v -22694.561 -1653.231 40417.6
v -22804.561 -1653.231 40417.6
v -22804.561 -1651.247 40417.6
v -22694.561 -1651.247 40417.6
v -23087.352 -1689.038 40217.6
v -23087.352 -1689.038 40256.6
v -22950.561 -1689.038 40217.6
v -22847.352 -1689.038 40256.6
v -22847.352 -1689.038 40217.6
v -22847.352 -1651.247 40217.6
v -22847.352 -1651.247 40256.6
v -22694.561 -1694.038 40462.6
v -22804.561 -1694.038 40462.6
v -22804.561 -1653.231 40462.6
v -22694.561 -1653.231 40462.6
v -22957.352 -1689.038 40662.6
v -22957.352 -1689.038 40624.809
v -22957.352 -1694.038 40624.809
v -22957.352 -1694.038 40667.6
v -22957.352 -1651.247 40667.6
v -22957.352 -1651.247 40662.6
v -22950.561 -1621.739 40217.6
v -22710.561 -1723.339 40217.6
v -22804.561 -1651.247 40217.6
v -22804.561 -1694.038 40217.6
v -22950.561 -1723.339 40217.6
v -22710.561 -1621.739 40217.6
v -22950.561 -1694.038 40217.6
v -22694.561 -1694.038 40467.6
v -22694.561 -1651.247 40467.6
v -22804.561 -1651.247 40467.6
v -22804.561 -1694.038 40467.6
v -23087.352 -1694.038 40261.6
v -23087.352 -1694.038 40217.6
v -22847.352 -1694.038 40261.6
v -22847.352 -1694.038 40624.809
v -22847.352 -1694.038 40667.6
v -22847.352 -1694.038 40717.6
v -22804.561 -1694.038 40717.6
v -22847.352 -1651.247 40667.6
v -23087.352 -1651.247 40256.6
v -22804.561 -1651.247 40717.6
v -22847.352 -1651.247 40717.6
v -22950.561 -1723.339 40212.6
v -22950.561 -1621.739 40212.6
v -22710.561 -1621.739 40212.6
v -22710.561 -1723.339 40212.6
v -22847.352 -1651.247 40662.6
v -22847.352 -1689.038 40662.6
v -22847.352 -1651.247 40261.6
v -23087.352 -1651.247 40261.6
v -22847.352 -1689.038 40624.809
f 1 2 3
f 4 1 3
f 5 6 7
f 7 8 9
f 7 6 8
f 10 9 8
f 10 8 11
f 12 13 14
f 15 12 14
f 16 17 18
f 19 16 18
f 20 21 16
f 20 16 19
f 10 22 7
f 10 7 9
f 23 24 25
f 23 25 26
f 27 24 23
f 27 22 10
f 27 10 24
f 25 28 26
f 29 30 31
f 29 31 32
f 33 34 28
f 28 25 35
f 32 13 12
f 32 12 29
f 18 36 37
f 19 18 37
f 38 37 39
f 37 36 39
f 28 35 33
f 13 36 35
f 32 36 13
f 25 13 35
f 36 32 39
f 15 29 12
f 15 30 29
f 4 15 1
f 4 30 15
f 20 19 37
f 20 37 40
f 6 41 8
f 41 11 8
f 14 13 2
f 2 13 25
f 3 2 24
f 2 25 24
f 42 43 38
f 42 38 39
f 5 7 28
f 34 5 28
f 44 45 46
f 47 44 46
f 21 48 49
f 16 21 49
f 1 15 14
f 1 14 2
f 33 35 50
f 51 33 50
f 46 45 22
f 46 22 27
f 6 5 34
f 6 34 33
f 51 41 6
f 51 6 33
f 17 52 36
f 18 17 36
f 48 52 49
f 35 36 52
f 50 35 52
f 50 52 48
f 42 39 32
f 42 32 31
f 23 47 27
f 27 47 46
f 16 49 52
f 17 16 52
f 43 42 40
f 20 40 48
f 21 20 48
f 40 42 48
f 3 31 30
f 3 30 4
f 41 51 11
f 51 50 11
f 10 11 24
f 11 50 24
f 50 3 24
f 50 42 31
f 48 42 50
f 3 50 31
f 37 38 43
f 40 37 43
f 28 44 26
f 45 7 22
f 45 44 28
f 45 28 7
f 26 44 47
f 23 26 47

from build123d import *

# Parameters (mm, degrees)
SKETCH1_W             = 240
SKETCH1_H             = 101.6
BOSS_EXTRUDE1_DEPTH   = 5
SKETCH2_W             = 42.790852113
SKETCH2_H             = 42.790852114
BOSS_EXTRUDE2_DEPTH   = 500
BOSS_EXTRUDE3_DEPTH   = 110
BOSS_EXTRUDE4_DEPTH   = 110
BOSS_EXTRUDE4_2_DEPTH = 110
BOSS_EXTRUDE5_START   = 110
BOSS_EXTRUDE5_DEPTH   = 130


# Read off the part's stored shape, not the designer's step: Boss-Extrude3
with BuildPart() as part:
    # Sketch1 → Boss-Extrude1 (new body)
    with BuildSketch(Plane.XY.offset(40212.600196068)):
        with Locations((-22830.561141865, -1672.538517707)):
            Rectangle(SKETCH1_W, SKETCH1_H)
    extrude(amount=BOSS_EXTRUDE1_DEPTH)


with BuildPart() as body_2:
    # Sketch2 → Boss-Extrude2 (new body)
    with BuildSketch(Plane.XY.offset(40217.600196068)):
        with Locations((-22825.956567922, -1672.642858756)):
            Rectangle(SKETCH2_W, SKETCH2_H)
    extrude(amount=BOSS_EXTRUDE2_DEPTH)


with BuildPart() as body_3:
    # Boss-Extrude3 outline → Boss-Extrude3 (new body)
    with BuildSketch(Plane(origin=(-22804.561141865, 0, 0), x_dir=(0, 0, -1), z_dir=(1, 0, 0))):
        Polygon((-40467.600196068, -1694.038284813), (-40462.600196068, -1694.038284813), (-40462.600196068, -1653.231371608), (-40417.600196068, -1653.231371608), (-40417.600196068, -1651.247432699), (-40467.600196068, -1651.247432699), align=None)
    extrude(amount=BOSS_EXTRUDE3_DEPTH)


with BuildPart() as body_4:
    # Sketch4 → Boss-Extrude4 (new body)
    with BuildSketch(Plane.ZY.offset(22847.351993978)):
        Polygon((40667.600196068, -1651.247432699), (40662.600196068, -1651.247432699), (40662.600196068, -1689.038284813), (40624.809343955, -1689.038284813), (40624.809343955, -1694.038284813), (40667.600196068, -1694.038284813), align=None)
    extrude(amount=BOSS_EXTRUDE4_DEPTH)


with BuildPart() as body_5:
    # Sketch4 → Boss-Extrude4 2 (new body)
    with BuildSketch(Plane.ZY.offset(22847.351993978)):
        Polygon((40261.600196068, -1651.247432699), (40256.600196068, -1651.247432699), (40256.600196068, -1689.038284813), (40217.600196068, -1689.038284813), (40217.600196068, -1694.038284813), (40261.600196068, -1694.038284813), align=None)
    extrude(amount=BOSS_EXTRUDE4_2_DEPTH)

    # Sketch4<3> → Boss-Extrude5 (add)
    with BuildSketch(Plane.ZY.offset(22847.351993978).offset(BOSS_EXTRUDE5_START)):
        Polygon((40261.600196068, -1694.038284813), (40261.600196068, -1651.247432699), (40256.600196068, -1651.247432699), (40256.600196068, -1689.038284813), (40217.600196068, -1689.038284813), (40217.600196068, -1694.038284813), align=None)
    extrude(amount=BOSS_EXTRUDE5_DEPTH)


with BuildPart() as body_2_1:
    add(body_2.part)

    # Combine1: union body 3, body 4, body 5, part
    add(body_3.part)
    add(body_4.part)
    add(body_5.part)
    add(part.part)


solid = body_2_1.part
